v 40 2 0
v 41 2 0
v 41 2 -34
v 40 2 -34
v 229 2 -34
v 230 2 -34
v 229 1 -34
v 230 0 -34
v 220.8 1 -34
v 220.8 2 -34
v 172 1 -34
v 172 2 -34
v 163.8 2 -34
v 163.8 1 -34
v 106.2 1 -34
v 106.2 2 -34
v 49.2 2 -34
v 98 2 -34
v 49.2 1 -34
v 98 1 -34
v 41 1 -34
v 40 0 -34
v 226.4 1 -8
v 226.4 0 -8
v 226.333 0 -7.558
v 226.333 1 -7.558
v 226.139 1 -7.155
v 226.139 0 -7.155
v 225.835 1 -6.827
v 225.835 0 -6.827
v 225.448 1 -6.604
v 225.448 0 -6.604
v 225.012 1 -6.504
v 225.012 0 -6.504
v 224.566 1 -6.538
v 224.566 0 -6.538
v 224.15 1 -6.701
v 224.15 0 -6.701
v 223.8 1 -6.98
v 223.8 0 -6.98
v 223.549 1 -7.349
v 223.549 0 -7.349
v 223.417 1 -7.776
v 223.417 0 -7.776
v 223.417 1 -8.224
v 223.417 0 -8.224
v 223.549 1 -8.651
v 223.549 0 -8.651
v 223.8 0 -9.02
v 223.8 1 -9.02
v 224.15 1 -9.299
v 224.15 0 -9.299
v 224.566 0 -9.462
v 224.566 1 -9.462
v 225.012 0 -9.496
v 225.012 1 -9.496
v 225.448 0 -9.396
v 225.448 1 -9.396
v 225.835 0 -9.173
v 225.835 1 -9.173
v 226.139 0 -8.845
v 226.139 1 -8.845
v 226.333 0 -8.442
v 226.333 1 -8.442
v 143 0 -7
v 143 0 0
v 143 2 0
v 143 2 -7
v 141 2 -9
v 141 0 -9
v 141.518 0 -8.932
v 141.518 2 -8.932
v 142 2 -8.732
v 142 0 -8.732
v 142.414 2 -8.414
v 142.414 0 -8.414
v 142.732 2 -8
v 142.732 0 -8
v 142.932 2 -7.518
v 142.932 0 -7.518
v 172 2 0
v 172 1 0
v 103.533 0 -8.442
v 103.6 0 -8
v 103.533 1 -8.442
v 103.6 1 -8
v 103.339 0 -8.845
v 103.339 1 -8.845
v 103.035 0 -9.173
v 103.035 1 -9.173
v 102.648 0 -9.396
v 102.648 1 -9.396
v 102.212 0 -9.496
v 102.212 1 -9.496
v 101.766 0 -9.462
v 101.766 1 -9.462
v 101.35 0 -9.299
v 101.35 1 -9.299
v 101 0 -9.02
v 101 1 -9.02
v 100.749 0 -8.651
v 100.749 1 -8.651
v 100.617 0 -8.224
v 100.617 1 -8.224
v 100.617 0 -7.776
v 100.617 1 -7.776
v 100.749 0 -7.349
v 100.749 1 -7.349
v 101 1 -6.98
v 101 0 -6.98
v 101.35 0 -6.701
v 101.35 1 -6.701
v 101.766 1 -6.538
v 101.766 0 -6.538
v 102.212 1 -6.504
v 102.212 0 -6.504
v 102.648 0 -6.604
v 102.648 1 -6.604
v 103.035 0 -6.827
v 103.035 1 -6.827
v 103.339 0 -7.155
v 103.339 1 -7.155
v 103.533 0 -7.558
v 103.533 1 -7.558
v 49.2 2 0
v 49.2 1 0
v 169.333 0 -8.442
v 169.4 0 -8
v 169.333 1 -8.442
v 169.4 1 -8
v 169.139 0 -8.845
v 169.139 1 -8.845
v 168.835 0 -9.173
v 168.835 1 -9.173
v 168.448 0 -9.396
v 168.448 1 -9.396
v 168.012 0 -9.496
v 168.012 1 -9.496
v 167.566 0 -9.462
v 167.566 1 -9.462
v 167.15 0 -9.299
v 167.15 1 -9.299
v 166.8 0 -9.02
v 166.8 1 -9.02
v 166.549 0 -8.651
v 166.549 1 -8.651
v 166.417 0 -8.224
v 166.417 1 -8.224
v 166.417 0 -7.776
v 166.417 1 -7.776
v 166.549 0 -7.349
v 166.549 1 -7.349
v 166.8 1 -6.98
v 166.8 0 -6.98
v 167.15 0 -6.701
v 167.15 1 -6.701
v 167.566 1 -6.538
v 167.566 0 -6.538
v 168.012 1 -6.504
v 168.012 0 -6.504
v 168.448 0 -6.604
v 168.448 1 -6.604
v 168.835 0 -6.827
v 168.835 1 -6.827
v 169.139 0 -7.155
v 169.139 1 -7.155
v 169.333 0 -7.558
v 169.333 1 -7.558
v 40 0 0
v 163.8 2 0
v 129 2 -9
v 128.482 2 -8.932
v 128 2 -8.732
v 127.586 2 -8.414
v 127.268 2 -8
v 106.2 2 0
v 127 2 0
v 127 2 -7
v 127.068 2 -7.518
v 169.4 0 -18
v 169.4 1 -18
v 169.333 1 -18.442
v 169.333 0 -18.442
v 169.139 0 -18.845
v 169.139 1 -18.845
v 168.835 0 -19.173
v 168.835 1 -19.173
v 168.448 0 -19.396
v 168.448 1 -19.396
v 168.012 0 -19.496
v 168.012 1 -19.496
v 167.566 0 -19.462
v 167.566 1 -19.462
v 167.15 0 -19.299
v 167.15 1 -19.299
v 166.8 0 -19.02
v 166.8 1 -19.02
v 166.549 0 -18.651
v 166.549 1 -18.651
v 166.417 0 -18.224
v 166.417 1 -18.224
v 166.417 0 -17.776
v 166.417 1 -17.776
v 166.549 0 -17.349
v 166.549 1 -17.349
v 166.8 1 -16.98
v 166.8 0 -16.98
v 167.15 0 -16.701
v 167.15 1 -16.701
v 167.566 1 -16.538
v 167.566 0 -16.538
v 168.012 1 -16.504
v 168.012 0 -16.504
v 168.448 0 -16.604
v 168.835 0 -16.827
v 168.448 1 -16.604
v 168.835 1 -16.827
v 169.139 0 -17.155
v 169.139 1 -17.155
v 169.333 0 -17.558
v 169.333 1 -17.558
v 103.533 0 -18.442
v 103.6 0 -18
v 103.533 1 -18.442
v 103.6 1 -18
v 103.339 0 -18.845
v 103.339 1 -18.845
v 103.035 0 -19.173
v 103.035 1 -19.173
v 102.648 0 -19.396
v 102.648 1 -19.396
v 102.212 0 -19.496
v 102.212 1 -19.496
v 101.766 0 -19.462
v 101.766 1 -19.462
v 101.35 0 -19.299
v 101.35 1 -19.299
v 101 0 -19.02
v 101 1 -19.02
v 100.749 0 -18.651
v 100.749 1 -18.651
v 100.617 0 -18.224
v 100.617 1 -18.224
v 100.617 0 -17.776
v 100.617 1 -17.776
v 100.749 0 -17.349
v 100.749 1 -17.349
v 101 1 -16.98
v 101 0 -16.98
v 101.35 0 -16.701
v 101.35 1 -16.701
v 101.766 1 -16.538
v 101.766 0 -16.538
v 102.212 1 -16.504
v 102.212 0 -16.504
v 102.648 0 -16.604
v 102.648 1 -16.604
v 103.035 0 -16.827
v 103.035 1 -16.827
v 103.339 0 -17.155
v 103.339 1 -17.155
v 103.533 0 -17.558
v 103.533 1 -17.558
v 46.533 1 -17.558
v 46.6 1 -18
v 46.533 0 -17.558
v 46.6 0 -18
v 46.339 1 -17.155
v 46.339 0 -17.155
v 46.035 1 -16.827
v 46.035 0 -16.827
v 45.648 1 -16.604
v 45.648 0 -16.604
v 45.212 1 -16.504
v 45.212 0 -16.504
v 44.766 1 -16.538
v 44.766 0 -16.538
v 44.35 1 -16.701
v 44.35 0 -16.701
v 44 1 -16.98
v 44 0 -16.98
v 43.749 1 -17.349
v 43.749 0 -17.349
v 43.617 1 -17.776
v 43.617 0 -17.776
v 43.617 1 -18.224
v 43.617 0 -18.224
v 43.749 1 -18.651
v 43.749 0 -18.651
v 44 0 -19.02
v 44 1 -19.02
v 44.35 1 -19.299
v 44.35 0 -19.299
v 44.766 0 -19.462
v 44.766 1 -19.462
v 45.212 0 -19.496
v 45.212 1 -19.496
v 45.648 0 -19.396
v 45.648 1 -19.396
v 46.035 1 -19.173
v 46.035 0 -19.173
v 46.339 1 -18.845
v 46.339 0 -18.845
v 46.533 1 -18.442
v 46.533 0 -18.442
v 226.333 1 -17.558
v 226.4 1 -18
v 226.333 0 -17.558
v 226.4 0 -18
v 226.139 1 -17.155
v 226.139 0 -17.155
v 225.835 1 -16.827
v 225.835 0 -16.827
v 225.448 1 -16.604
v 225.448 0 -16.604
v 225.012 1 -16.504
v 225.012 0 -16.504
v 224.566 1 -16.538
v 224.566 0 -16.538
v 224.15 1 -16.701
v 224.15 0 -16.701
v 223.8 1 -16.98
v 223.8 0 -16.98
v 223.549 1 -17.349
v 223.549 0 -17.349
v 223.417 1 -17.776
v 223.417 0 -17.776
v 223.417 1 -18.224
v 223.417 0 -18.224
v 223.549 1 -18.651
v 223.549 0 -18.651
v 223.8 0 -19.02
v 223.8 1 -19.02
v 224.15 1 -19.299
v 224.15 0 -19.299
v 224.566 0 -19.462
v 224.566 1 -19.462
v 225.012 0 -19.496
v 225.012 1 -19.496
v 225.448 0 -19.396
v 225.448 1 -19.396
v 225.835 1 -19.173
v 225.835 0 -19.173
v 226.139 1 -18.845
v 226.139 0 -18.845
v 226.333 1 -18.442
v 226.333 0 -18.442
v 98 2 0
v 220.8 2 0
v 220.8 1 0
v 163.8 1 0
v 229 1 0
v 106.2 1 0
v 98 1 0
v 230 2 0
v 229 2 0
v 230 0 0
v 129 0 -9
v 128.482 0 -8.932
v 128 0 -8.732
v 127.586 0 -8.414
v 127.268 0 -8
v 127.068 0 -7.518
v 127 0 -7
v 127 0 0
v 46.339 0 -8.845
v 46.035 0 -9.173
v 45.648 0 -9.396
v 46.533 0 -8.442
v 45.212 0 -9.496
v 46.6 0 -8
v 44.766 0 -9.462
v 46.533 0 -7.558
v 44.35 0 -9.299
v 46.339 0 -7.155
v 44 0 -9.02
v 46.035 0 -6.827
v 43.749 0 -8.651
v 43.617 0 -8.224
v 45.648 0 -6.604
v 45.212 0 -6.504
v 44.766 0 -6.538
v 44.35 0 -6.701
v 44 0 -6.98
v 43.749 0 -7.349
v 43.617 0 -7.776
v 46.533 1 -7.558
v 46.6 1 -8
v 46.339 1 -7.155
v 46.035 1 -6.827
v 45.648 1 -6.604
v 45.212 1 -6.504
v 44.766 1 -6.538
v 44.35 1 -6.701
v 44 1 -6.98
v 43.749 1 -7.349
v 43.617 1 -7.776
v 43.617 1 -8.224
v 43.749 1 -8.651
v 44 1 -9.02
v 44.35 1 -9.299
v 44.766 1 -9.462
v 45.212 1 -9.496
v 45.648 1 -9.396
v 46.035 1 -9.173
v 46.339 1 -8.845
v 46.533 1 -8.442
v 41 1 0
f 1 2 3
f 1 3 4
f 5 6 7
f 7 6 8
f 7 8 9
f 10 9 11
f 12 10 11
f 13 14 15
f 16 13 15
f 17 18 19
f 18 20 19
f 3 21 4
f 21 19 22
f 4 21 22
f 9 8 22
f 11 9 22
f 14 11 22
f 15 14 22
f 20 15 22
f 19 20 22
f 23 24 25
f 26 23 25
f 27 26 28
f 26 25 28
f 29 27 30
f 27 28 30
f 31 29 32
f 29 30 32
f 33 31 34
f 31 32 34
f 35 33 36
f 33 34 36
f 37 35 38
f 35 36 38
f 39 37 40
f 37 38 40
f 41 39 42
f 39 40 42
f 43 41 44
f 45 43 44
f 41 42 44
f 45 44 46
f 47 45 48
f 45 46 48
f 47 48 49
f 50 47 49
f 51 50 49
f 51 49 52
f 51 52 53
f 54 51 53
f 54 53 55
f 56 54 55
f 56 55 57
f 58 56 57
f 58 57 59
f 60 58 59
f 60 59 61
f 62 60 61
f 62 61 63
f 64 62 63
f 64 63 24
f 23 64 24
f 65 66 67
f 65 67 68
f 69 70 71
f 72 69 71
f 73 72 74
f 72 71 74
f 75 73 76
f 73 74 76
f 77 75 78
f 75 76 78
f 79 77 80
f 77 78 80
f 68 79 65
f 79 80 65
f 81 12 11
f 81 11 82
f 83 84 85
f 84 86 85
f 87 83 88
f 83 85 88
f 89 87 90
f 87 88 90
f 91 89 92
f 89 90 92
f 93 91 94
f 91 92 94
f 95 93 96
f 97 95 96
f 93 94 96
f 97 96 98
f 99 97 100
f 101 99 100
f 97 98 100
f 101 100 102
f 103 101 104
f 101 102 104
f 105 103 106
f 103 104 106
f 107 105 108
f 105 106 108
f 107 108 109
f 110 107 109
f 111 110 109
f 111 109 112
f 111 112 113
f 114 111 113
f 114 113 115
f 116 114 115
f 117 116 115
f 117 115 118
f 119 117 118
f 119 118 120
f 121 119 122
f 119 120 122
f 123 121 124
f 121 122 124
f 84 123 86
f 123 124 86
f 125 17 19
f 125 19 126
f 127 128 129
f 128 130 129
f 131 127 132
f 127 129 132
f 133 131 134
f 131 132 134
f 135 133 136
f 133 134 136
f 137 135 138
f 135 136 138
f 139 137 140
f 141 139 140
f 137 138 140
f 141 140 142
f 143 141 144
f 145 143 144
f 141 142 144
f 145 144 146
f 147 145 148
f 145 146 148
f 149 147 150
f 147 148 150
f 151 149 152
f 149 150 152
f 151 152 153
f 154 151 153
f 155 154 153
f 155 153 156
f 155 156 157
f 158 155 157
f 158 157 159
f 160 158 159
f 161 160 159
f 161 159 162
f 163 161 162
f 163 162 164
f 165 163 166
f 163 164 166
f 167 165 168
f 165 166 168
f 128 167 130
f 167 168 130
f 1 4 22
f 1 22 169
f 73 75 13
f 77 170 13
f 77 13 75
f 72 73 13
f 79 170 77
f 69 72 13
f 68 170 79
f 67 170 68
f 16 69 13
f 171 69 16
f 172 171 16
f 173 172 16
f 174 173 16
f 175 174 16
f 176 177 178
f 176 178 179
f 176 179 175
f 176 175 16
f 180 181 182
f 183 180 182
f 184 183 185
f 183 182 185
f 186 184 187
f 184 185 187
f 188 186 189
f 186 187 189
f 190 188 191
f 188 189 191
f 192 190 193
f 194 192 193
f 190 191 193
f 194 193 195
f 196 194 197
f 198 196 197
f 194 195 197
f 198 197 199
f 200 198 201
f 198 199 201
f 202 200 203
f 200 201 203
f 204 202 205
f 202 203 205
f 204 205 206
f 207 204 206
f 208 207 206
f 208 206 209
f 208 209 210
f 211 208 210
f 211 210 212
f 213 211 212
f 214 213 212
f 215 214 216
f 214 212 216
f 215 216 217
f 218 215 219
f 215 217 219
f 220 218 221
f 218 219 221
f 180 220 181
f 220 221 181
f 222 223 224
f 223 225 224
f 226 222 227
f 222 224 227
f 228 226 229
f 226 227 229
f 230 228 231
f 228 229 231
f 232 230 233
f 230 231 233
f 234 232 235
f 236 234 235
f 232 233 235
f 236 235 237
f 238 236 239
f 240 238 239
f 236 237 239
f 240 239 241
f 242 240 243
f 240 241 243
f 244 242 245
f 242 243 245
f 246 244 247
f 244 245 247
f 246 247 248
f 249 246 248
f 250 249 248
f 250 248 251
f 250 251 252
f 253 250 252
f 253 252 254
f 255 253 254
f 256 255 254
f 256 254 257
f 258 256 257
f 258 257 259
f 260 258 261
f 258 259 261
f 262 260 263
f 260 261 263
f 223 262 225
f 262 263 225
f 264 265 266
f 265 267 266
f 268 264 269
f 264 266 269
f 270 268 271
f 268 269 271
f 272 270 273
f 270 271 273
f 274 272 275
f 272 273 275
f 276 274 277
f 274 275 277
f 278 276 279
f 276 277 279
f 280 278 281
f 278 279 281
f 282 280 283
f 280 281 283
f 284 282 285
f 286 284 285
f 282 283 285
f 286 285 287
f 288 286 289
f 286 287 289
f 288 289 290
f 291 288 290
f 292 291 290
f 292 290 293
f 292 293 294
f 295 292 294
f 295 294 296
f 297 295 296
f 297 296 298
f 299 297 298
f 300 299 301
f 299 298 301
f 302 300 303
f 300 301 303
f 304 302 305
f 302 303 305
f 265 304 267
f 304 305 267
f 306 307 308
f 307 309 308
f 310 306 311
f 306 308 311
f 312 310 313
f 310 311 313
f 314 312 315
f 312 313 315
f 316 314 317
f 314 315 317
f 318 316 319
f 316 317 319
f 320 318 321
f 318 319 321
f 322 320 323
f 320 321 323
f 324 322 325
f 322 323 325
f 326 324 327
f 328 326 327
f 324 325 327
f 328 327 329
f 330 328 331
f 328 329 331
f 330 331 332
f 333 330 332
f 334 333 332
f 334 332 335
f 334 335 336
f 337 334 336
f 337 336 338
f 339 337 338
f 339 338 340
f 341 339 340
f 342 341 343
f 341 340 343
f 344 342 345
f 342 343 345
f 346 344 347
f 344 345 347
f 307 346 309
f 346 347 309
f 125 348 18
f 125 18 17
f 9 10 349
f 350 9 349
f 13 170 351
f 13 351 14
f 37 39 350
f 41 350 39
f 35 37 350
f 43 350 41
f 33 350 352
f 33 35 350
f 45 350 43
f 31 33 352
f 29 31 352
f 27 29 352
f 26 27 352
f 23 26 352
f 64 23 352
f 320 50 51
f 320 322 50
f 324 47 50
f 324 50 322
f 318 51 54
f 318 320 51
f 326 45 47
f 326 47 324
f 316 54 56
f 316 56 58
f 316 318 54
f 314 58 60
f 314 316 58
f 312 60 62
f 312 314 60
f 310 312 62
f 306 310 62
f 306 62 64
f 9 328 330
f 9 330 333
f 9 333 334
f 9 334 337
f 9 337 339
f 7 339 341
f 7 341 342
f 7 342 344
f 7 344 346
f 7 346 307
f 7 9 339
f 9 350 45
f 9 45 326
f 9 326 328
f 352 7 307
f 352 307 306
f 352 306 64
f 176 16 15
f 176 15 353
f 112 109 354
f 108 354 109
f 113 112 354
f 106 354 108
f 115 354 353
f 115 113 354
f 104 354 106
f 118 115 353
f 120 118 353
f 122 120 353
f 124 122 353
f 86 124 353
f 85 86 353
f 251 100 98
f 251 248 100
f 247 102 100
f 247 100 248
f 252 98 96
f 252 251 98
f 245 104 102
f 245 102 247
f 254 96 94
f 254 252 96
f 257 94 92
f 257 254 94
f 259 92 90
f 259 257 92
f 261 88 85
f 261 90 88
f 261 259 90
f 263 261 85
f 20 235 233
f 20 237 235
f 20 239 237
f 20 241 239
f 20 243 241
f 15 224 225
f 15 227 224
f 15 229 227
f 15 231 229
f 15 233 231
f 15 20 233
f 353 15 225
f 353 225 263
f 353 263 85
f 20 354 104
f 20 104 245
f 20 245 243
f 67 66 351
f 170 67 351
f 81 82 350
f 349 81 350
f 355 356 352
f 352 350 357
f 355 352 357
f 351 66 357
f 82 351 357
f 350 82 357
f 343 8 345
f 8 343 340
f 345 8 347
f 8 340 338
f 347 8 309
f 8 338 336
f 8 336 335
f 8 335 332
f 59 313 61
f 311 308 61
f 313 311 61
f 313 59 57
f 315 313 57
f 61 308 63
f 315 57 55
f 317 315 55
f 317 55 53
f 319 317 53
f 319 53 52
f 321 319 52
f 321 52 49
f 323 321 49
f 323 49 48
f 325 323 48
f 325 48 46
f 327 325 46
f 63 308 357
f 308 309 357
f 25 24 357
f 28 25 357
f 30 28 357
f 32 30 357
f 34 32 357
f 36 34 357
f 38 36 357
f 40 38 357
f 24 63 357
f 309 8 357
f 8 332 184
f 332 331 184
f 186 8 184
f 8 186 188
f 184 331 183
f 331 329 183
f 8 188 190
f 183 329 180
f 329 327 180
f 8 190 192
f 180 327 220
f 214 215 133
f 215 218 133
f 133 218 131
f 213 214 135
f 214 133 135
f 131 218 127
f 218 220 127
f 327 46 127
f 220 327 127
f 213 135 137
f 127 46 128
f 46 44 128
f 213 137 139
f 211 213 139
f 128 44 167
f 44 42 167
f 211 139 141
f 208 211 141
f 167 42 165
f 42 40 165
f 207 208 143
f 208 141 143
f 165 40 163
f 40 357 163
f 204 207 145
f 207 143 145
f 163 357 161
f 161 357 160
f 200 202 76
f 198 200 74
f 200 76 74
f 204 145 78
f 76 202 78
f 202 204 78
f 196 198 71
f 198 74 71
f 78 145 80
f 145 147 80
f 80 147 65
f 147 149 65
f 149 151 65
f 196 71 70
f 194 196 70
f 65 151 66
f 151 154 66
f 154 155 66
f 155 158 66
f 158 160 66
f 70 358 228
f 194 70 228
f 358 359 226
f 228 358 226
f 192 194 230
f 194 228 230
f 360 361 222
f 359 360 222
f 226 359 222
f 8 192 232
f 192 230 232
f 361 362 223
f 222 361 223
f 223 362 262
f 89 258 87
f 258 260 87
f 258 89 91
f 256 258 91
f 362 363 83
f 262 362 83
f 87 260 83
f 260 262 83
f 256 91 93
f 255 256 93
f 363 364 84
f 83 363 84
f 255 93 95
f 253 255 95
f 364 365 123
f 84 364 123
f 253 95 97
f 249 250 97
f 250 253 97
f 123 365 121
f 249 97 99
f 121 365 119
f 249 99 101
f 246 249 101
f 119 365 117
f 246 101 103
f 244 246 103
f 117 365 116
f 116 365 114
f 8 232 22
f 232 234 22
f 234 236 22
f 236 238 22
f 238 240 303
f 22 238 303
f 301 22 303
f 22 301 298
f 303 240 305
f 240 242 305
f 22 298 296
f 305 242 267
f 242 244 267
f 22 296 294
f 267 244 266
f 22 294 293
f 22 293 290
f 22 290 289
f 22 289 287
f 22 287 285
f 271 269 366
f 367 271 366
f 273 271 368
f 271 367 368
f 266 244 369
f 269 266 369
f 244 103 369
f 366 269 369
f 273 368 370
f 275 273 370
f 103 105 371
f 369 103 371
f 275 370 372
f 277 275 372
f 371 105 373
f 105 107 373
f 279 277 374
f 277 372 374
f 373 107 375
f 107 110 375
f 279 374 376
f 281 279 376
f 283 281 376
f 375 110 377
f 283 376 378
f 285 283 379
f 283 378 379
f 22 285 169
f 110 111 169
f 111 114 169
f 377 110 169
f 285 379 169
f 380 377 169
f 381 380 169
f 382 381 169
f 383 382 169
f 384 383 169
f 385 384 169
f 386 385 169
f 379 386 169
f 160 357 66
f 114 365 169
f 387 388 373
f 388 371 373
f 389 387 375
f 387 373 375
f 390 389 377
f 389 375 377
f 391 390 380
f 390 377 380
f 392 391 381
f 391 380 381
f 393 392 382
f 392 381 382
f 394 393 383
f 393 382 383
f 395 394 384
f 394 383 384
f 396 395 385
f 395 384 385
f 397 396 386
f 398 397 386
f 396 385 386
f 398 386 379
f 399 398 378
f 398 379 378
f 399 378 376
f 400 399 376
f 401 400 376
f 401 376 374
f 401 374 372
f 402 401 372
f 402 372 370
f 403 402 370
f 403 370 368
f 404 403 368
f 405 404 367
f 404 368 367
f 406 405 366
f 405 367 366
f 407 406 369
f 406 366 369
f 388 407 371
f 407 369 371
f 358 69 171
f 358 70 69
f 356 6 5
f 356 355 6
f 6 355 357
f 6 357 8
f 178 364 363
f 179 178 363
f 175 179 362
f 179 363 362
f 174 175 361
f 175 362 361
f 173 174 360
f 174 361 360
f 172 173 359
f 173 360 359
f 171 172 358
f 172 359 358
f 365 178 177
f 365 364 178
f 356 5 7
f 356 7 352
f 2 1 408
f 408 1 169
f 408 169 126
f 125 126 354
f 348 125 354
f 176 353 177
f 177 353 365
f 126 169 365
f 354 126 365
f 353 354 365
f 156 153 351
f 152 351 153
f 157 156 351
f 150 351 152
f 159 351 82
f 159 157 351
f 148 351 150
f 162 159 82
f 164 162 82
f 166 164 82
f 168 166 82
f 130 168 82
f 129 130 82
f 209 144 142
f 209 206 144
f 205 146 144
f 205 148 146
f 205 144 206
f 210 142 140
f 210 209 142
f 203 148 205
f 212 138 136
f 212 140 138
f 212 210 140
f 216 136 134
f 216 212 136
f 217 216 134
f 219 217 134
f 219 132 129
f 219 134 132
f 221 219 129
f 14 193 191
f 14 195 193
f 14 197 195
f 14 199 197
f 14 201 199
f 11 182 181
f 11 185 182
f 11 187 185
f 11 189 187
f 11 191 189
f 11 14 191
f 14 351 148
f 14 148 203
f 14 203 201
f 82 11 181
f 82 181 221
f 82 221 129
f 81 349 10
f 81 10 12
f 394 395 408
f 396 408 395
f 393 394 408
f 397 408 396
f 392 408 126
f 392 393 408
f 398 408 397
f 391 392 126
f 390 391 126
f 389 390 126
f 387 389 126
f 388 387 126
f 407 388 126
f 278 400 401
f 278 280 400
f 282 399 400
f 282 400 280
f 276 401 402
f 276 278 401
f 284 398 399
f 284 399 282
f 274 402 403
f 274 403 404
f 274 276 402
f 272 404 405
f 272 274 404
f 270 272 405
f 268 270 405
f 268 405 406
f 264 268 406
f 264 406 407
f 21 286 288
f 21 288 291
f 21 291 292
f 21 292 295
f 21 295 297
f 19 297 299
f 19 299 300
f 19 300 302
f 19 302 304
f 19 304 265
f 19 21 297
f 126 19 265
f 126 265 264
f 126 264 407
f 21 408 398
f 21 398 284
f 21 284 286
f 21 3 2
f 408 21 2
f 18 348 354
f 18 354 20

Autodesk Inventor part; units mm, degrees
ref_plane "YZ Plane" through (0, 0, 0) normal (1, 0, 0) x (0, 1, 0)
ref_plane "XZ Plane" through (0, 0, 0) normal (0, 1, 0) x (-1, 0, 0)
ref_plane "XY Plane" through (0, 0, 0) normal (0, 0, 1) x (1, 0, 0)
sketch "스케치1" plane through (0, 0, 0) normal (0, 1, 0) x (-1, 0, 0)
  line L0 (0, 0) -> (-270, 0)
  line L1 (-270, 0) -> (-270, -34)
  line L2 (-270, -34) -> (0, -34)
  line L3 (0, -34) -> (0, 0)
  dimension "d0" = 270
  dimension "d1" = 34
extrude "돌출1" add sketch "스케치1" along normal blind 2
sketch "스케치2" plane through (0, 2, 0) normal (0, 1, 0) x (1, 0, 0)
  line L0 (0, 0) -> (270, 0) projected
  line L1 (0, 34) -> (0, 0) projected
  line L2 (270, 34) -> (0, 34) projected
  line L3 (270, 0) -> (270, 34) projected
  line L4 (270, 0) -> (270, 34) projected
  line L5 (41, 34) -> (41, 0)
  line L6 (41, 34) -> (49.2, 34)
  line L7 (49.2, 34) -> (49.2, 0)
  line L8 (0, 0) -> (270, 0) projected
  line L9 (230, 34) -> (229, 34)
  line L10 (229, 34) -> (220.8, 34)
  line L11 (220.8, 34) -> (220.8, 0)
  line L12 (229, 34) -> (229, 0)
  line L13 (1, 34) -> (1, 0)
  line L14 (9.2, 34) -> (9.2, 0)
  line L15 (269, 34) -> (269, 0)
  line L16 (260.8, 34) -> (260.8, 0)
  line L17 (1, 0) -> (9.2, 0)
  line L18 (260.8, 0) -> (269, 0)
  line L19 (229, 0) -> (220.8, 0)
  line L20 (41, 0) -> (49.2, 0)
  line L21 (1, 34) -> (9.2, 34)
  line L22 (270, 34) -> (0, 34) projected
  line L23 (260.8, 34) -> (269, 34)
  point P0 (285, 0)
  dimension "d4" = 40
  dimension "d7" = 8.2
  dimension "d8" = 1
  dimension "d9" = 8.2
  dimension "d17" = 1
  dimension "d18" = 8.2
  dimension "d19" = 1
  dimension "d20" = 8.2
extrude "돌출4" cut sketch "스케치2" against normal blind 1 contours L13 L2 L14 L0 | L5 L2 L7 L0 | L11 L2 L12 L0 | L16 L2 L15 L0
sketch "스케치4" plane through (0, 0, 0) normal (0, -1, 0) x (1, 0, 0)
  line L0 (0, 0) -> (270, 0) projected
  line L1 (0, -34) -> (0, 0) projected
  line L2 (270, -34) -> (0, -34) projected
  line L3 (270, 0) -> (270, -34) projected
  line L4 (127, 0) -> (143, 0)
  line L5 (143, 0) -> (143, -7)
  line L6 (141, -9) -> (129, -9)
  line L7 (127, -7) -> (127, 0)
  line L8 (0, -34) -> (0, 0) projected
  line L9 (270, 0) -> (270, -34) projected
  arc A0 (127, -7) -> (129, -9) centre (129, -7) ccw
  arc A1 (141, -9) -> (143, -7) centre (141, -7) ccw
  point P0 (143, -9)
  point P1 (127, -9)
  dimension "d23" = 9
  dimension "d24" = 127
  dimension "d25" = 127
  dimension "d54" = 2
extrude "돌출5" cut sketch "스케치4" against normal blind 10 contours L0 L5 A1 L6 A0 L7
sketch "스케치5" plane through (0, 0, 0) normal (0, -1, 0) x (1, 0, 0)
  line L0 (9.2, 0) -> (1, 0) projected
  line L1 (9.2, -34) -> (9.2, 0) projected
  line L2 (1, -34) -> (9.2, -34) projected
  line L3 (1, 0) -> (1, -34) projected
  line L4 (49.2, 0) -> (41, 0) projected
  line L5 (49.2, -34) -> (49.2, 0) projected
  line L6 (41, -34) -> (49.2, -34) projected
  line L7 (41, 0) -> (41, -34) projected
  line L8 (229, 0) -> (220.8, 0) projected
  line L9 (229, -34) -> (229, 0) projected
  line L10 (220.8, -34) -> (229, -34) projected
  line L11 (220.8, 0) -> (220.8, -34) projected
  line L12 (269, 0) -> (260.8, 0) projected
  line L13 (269, -34) -> (269, 0) projected
  line L14 (260.8, -34) -> (269, -34) projected
  line L15 (260.8, 0) -> (260.8, -34) projected
  circle A0 centre (5.1, -8) radius 1.5
  circle A1 centre (5.1, -18) radius 1.5
  circle A2 centre (45.1, -8) radius 1.5
  circle A3 centre (45.1, -18) radius 1.5
  circle A4 centre (224.9, -18) radius 1.5
  circle A5 centre (224.9, -8) radius 1.5
  circle A6 centre (264.9, -8) radius 1.5
  circle A7 centre (264.9, -18) radius 1.5
  point P0 (0, 0)
  dimension "d28" = 3
  dimension "d29" = 3
  dimension "d30" = 3
  dimension "d31" = 4.1
  dimension "d32" = 4.1
  dimension "d33" = 4.1
  dimension "d34" = 4.1
  dimension "d35" = 4.1
  dimension "d36" = 4.1
  dimension "d37" = 4.1
  dimension "d38" = 4.1
  dimension "d39" = 8
  dimension "d40" = 16
  dimension "d41" = 16
  dimension "d42" = 8
  dimension "d43" = 8
  dimension "d44" = 3
  dimension "d45" = 16
  dimension "d46" = 3
  dimension "d47" = 16
  dimension "d48" = 8
  dimension "d49" = 3
  dimension "d50" = 3
  dimension "d51" = 3
extrude "돌출6" cut sketch "스케치5" against normal blind 10 contours A0 | A1 | A2 | A3 | A4 | A5 | A6 | A7
sketch "스케치6" plane through (0, 2, 0) normal (0, 1, 0) x (1, 0, 0)
  line L0 (143, 7) -> (143, 0) projected
  line L1 (143, 0) -> (220.8, 0) projected
  line L2 (220.8, 0) -> (220.8, 34) projected
  line L3 (220.8, 34) -> (49.2, 34) projected
  line L4 (49.2, 34) -> (49.2, 0) projected
  line L5 (127, 0) -> (127, 7) projected
  arc A0 (129, 9) -> (127, 7) centre (129, 7) ccw projected
  line L6 (129, 9) -> (141, 9) projected
  arc A1 (143, 7) -> (141, 9) centre (141, 7) ccw projected
  circle A2 centre (264.9, 8) radius 1.5 projected
  circle A3 centre (224.9, 18) radius 1.5 projected
  circle A4 centre (45.1, 8) radius 1.5 projected
  circle A5 centre (5.1, 8) radius 1.5 projected
  circle A6 centre (5.1, 18) radius 1.5 projected
  circle A7 centre (45.1, 18) radius 1.5 projected
  circle A8 centre (224.9, 8) radius 1.5 projected
  circle A9 centre (264.9, 18) radius 1.5 projected
  line L7 (143, 0) -> (143, 7) projected
  arc A10 (141, 9) -> (143, 7) centre (141, 7) ccw projected
  line L8 (141, 9) -> (129, 9) projected
  arc A11 (127, 7) -> (129, 9) centre (129, 7) ccw projected
  line L9 (127, 7) -> (127, 0) projected
  line L10 (0, 0) -> (127, 0) projected
  line L11 (0, 34) -> (0, 0) projected
  line L12 (270, 34) -> (0, 34) projected
  line L13 (270, 0) -> (270, 34) projected
  line L14 (49.2, 0) -> (127, 0) projected
  line L15 (98, 34) -> (106.2, 34)
  line L16 (106.2, 34) -> (106.2, 0)
  line L17 (106.2, 0) -> (98, 0)
  line L18 (98, 0) -> (98, 34)
  line L19 (220.8, 34) -> (49.2, 34) projected
  line L20 (143, 0) -> (220.8, 0) projected
  line L21 (163.8, 34) -> (172, 34)
  line L22 (172, 34) -> (172, 0)
  line L23 (172, 0) -> (163.8, 0)
  line L24 (163.8, 0) -> (163.8, 34)
  line L25 (229, 34) -> (229, 0) projected
  line L26 (229, 0) -> (260.8, 0) projected
  line L27 (260.8, 0) -> (260.8, 34) projected
  line L28 (260.8, 34) -> (229, 34) projected
  line L29 (41, 0) -> (41, 34) projected
  line L30 (41, 34) -> (9.2, 34) projected
  line L31 (9.2, 34) -> (9.2, 0) projected
  line L32 (9.2, 0) -> (41, 0) projected
  line L33 (1, 0) -> (1, 34) projected
  line L34 (1, 34) -> (0, 34) projected
  line L35 (0, 34) -> (0, 0) projected
  line L36 (0, 0) -> (1, 0) projected
  line L37 (269, 34) -> (269, 0) projected
  line L38 (269, 0) -> (270, 0) projected
  line L39 (270, 0) -> (270, 34) projected
  line L40 (270, 34) -> (269, 34) projected
  line L41 (49.2, 0) -> (127, 0) projected
  line L42 (143, 0) -> (270, 0) projected
  point P0 (163, 0)
  dimension "d55" = 8.2
  dimension "d56" = 8.2
  dimension "d57" = 98
  dimension "d58" = 98
extrude "돌출7" cut sketch "스케치6" against normal blind 1 contours L24 L3 L22 L1 | L16 L10 L18 L3
sketch "스케치7" plane through (0, 1, 0) normal (0, 1, 0) x (1, 0, 0)
  line L0 (106.2, 34) -> (106.2, 0) projected
  line L1 (98, 34) -> (106.2, 34) projected
  line L2 (98, 0) -> (98, 34) projected
  line L3 (106.2, 0) -> (98, 0) projected
  line L4 (172, 34) -> (172, 0) projected
  line L5 (163.8, 34) -> (172, 34) projected
  line L6 (163.8, 0) -> (163.8, 34) projected
  line L7 (172, 0) -> (163.8, 0) projected
  circle A0 centre (102.1, 8) radius 1.5
  circle A1 centre (102.1, 18) radius 1.5
  circle A2 centre (167.9, 18) radius 1.5
  circle A3 centre (167.9, 8) radius 1.5
  point P0 (0, 0)
  dimension "d61" = 3
  dimension "d62" = 3
  dimension "d63" = 3
  dimension "d64" = 3
  dimension "d65" = 4.1
  dimension "d66" = 4.1
  dimension "d67" = 4.1
  dimension "d68" = 4.1
  dimension "d69" = 8
  dimension "d71" = 8
  dimension "d75" = 16
  dimension "d76" = 16
extrude "돌출8" cut sketch "스케치7" against normal blind 1 contours A0 | A1 | A2 | A3
sketch "스케치8" plane through (0, 2, 0) normal (0, 1, 0) x (1, 0, 0)
  line L0 (230, 0) -> (230, 33)
  line L1 (40, 0) -> (40, 33)
  line L2 (230, 0) -> (270, 0)
  line L3 (270, 0) -> (270, 34)
  line L4 (270, 34) -> (230, 34)
  line L5 (230, 34) -> (230, 0)
  line L6 (1, 34) -> (0, 34) projected
  line L7 (40, 0) -> (0, 0)
  line L8 (0, 0) -> (0, 34)
  line L9 (0, 34) -> (40, 34)
  line L10 (40, 34) -> (40, 0)
extrude "돌출9" cut sketch "스케치8" against normal blind 10
properties part number "앞뒷판_밑" material "알루미늄 6061"
